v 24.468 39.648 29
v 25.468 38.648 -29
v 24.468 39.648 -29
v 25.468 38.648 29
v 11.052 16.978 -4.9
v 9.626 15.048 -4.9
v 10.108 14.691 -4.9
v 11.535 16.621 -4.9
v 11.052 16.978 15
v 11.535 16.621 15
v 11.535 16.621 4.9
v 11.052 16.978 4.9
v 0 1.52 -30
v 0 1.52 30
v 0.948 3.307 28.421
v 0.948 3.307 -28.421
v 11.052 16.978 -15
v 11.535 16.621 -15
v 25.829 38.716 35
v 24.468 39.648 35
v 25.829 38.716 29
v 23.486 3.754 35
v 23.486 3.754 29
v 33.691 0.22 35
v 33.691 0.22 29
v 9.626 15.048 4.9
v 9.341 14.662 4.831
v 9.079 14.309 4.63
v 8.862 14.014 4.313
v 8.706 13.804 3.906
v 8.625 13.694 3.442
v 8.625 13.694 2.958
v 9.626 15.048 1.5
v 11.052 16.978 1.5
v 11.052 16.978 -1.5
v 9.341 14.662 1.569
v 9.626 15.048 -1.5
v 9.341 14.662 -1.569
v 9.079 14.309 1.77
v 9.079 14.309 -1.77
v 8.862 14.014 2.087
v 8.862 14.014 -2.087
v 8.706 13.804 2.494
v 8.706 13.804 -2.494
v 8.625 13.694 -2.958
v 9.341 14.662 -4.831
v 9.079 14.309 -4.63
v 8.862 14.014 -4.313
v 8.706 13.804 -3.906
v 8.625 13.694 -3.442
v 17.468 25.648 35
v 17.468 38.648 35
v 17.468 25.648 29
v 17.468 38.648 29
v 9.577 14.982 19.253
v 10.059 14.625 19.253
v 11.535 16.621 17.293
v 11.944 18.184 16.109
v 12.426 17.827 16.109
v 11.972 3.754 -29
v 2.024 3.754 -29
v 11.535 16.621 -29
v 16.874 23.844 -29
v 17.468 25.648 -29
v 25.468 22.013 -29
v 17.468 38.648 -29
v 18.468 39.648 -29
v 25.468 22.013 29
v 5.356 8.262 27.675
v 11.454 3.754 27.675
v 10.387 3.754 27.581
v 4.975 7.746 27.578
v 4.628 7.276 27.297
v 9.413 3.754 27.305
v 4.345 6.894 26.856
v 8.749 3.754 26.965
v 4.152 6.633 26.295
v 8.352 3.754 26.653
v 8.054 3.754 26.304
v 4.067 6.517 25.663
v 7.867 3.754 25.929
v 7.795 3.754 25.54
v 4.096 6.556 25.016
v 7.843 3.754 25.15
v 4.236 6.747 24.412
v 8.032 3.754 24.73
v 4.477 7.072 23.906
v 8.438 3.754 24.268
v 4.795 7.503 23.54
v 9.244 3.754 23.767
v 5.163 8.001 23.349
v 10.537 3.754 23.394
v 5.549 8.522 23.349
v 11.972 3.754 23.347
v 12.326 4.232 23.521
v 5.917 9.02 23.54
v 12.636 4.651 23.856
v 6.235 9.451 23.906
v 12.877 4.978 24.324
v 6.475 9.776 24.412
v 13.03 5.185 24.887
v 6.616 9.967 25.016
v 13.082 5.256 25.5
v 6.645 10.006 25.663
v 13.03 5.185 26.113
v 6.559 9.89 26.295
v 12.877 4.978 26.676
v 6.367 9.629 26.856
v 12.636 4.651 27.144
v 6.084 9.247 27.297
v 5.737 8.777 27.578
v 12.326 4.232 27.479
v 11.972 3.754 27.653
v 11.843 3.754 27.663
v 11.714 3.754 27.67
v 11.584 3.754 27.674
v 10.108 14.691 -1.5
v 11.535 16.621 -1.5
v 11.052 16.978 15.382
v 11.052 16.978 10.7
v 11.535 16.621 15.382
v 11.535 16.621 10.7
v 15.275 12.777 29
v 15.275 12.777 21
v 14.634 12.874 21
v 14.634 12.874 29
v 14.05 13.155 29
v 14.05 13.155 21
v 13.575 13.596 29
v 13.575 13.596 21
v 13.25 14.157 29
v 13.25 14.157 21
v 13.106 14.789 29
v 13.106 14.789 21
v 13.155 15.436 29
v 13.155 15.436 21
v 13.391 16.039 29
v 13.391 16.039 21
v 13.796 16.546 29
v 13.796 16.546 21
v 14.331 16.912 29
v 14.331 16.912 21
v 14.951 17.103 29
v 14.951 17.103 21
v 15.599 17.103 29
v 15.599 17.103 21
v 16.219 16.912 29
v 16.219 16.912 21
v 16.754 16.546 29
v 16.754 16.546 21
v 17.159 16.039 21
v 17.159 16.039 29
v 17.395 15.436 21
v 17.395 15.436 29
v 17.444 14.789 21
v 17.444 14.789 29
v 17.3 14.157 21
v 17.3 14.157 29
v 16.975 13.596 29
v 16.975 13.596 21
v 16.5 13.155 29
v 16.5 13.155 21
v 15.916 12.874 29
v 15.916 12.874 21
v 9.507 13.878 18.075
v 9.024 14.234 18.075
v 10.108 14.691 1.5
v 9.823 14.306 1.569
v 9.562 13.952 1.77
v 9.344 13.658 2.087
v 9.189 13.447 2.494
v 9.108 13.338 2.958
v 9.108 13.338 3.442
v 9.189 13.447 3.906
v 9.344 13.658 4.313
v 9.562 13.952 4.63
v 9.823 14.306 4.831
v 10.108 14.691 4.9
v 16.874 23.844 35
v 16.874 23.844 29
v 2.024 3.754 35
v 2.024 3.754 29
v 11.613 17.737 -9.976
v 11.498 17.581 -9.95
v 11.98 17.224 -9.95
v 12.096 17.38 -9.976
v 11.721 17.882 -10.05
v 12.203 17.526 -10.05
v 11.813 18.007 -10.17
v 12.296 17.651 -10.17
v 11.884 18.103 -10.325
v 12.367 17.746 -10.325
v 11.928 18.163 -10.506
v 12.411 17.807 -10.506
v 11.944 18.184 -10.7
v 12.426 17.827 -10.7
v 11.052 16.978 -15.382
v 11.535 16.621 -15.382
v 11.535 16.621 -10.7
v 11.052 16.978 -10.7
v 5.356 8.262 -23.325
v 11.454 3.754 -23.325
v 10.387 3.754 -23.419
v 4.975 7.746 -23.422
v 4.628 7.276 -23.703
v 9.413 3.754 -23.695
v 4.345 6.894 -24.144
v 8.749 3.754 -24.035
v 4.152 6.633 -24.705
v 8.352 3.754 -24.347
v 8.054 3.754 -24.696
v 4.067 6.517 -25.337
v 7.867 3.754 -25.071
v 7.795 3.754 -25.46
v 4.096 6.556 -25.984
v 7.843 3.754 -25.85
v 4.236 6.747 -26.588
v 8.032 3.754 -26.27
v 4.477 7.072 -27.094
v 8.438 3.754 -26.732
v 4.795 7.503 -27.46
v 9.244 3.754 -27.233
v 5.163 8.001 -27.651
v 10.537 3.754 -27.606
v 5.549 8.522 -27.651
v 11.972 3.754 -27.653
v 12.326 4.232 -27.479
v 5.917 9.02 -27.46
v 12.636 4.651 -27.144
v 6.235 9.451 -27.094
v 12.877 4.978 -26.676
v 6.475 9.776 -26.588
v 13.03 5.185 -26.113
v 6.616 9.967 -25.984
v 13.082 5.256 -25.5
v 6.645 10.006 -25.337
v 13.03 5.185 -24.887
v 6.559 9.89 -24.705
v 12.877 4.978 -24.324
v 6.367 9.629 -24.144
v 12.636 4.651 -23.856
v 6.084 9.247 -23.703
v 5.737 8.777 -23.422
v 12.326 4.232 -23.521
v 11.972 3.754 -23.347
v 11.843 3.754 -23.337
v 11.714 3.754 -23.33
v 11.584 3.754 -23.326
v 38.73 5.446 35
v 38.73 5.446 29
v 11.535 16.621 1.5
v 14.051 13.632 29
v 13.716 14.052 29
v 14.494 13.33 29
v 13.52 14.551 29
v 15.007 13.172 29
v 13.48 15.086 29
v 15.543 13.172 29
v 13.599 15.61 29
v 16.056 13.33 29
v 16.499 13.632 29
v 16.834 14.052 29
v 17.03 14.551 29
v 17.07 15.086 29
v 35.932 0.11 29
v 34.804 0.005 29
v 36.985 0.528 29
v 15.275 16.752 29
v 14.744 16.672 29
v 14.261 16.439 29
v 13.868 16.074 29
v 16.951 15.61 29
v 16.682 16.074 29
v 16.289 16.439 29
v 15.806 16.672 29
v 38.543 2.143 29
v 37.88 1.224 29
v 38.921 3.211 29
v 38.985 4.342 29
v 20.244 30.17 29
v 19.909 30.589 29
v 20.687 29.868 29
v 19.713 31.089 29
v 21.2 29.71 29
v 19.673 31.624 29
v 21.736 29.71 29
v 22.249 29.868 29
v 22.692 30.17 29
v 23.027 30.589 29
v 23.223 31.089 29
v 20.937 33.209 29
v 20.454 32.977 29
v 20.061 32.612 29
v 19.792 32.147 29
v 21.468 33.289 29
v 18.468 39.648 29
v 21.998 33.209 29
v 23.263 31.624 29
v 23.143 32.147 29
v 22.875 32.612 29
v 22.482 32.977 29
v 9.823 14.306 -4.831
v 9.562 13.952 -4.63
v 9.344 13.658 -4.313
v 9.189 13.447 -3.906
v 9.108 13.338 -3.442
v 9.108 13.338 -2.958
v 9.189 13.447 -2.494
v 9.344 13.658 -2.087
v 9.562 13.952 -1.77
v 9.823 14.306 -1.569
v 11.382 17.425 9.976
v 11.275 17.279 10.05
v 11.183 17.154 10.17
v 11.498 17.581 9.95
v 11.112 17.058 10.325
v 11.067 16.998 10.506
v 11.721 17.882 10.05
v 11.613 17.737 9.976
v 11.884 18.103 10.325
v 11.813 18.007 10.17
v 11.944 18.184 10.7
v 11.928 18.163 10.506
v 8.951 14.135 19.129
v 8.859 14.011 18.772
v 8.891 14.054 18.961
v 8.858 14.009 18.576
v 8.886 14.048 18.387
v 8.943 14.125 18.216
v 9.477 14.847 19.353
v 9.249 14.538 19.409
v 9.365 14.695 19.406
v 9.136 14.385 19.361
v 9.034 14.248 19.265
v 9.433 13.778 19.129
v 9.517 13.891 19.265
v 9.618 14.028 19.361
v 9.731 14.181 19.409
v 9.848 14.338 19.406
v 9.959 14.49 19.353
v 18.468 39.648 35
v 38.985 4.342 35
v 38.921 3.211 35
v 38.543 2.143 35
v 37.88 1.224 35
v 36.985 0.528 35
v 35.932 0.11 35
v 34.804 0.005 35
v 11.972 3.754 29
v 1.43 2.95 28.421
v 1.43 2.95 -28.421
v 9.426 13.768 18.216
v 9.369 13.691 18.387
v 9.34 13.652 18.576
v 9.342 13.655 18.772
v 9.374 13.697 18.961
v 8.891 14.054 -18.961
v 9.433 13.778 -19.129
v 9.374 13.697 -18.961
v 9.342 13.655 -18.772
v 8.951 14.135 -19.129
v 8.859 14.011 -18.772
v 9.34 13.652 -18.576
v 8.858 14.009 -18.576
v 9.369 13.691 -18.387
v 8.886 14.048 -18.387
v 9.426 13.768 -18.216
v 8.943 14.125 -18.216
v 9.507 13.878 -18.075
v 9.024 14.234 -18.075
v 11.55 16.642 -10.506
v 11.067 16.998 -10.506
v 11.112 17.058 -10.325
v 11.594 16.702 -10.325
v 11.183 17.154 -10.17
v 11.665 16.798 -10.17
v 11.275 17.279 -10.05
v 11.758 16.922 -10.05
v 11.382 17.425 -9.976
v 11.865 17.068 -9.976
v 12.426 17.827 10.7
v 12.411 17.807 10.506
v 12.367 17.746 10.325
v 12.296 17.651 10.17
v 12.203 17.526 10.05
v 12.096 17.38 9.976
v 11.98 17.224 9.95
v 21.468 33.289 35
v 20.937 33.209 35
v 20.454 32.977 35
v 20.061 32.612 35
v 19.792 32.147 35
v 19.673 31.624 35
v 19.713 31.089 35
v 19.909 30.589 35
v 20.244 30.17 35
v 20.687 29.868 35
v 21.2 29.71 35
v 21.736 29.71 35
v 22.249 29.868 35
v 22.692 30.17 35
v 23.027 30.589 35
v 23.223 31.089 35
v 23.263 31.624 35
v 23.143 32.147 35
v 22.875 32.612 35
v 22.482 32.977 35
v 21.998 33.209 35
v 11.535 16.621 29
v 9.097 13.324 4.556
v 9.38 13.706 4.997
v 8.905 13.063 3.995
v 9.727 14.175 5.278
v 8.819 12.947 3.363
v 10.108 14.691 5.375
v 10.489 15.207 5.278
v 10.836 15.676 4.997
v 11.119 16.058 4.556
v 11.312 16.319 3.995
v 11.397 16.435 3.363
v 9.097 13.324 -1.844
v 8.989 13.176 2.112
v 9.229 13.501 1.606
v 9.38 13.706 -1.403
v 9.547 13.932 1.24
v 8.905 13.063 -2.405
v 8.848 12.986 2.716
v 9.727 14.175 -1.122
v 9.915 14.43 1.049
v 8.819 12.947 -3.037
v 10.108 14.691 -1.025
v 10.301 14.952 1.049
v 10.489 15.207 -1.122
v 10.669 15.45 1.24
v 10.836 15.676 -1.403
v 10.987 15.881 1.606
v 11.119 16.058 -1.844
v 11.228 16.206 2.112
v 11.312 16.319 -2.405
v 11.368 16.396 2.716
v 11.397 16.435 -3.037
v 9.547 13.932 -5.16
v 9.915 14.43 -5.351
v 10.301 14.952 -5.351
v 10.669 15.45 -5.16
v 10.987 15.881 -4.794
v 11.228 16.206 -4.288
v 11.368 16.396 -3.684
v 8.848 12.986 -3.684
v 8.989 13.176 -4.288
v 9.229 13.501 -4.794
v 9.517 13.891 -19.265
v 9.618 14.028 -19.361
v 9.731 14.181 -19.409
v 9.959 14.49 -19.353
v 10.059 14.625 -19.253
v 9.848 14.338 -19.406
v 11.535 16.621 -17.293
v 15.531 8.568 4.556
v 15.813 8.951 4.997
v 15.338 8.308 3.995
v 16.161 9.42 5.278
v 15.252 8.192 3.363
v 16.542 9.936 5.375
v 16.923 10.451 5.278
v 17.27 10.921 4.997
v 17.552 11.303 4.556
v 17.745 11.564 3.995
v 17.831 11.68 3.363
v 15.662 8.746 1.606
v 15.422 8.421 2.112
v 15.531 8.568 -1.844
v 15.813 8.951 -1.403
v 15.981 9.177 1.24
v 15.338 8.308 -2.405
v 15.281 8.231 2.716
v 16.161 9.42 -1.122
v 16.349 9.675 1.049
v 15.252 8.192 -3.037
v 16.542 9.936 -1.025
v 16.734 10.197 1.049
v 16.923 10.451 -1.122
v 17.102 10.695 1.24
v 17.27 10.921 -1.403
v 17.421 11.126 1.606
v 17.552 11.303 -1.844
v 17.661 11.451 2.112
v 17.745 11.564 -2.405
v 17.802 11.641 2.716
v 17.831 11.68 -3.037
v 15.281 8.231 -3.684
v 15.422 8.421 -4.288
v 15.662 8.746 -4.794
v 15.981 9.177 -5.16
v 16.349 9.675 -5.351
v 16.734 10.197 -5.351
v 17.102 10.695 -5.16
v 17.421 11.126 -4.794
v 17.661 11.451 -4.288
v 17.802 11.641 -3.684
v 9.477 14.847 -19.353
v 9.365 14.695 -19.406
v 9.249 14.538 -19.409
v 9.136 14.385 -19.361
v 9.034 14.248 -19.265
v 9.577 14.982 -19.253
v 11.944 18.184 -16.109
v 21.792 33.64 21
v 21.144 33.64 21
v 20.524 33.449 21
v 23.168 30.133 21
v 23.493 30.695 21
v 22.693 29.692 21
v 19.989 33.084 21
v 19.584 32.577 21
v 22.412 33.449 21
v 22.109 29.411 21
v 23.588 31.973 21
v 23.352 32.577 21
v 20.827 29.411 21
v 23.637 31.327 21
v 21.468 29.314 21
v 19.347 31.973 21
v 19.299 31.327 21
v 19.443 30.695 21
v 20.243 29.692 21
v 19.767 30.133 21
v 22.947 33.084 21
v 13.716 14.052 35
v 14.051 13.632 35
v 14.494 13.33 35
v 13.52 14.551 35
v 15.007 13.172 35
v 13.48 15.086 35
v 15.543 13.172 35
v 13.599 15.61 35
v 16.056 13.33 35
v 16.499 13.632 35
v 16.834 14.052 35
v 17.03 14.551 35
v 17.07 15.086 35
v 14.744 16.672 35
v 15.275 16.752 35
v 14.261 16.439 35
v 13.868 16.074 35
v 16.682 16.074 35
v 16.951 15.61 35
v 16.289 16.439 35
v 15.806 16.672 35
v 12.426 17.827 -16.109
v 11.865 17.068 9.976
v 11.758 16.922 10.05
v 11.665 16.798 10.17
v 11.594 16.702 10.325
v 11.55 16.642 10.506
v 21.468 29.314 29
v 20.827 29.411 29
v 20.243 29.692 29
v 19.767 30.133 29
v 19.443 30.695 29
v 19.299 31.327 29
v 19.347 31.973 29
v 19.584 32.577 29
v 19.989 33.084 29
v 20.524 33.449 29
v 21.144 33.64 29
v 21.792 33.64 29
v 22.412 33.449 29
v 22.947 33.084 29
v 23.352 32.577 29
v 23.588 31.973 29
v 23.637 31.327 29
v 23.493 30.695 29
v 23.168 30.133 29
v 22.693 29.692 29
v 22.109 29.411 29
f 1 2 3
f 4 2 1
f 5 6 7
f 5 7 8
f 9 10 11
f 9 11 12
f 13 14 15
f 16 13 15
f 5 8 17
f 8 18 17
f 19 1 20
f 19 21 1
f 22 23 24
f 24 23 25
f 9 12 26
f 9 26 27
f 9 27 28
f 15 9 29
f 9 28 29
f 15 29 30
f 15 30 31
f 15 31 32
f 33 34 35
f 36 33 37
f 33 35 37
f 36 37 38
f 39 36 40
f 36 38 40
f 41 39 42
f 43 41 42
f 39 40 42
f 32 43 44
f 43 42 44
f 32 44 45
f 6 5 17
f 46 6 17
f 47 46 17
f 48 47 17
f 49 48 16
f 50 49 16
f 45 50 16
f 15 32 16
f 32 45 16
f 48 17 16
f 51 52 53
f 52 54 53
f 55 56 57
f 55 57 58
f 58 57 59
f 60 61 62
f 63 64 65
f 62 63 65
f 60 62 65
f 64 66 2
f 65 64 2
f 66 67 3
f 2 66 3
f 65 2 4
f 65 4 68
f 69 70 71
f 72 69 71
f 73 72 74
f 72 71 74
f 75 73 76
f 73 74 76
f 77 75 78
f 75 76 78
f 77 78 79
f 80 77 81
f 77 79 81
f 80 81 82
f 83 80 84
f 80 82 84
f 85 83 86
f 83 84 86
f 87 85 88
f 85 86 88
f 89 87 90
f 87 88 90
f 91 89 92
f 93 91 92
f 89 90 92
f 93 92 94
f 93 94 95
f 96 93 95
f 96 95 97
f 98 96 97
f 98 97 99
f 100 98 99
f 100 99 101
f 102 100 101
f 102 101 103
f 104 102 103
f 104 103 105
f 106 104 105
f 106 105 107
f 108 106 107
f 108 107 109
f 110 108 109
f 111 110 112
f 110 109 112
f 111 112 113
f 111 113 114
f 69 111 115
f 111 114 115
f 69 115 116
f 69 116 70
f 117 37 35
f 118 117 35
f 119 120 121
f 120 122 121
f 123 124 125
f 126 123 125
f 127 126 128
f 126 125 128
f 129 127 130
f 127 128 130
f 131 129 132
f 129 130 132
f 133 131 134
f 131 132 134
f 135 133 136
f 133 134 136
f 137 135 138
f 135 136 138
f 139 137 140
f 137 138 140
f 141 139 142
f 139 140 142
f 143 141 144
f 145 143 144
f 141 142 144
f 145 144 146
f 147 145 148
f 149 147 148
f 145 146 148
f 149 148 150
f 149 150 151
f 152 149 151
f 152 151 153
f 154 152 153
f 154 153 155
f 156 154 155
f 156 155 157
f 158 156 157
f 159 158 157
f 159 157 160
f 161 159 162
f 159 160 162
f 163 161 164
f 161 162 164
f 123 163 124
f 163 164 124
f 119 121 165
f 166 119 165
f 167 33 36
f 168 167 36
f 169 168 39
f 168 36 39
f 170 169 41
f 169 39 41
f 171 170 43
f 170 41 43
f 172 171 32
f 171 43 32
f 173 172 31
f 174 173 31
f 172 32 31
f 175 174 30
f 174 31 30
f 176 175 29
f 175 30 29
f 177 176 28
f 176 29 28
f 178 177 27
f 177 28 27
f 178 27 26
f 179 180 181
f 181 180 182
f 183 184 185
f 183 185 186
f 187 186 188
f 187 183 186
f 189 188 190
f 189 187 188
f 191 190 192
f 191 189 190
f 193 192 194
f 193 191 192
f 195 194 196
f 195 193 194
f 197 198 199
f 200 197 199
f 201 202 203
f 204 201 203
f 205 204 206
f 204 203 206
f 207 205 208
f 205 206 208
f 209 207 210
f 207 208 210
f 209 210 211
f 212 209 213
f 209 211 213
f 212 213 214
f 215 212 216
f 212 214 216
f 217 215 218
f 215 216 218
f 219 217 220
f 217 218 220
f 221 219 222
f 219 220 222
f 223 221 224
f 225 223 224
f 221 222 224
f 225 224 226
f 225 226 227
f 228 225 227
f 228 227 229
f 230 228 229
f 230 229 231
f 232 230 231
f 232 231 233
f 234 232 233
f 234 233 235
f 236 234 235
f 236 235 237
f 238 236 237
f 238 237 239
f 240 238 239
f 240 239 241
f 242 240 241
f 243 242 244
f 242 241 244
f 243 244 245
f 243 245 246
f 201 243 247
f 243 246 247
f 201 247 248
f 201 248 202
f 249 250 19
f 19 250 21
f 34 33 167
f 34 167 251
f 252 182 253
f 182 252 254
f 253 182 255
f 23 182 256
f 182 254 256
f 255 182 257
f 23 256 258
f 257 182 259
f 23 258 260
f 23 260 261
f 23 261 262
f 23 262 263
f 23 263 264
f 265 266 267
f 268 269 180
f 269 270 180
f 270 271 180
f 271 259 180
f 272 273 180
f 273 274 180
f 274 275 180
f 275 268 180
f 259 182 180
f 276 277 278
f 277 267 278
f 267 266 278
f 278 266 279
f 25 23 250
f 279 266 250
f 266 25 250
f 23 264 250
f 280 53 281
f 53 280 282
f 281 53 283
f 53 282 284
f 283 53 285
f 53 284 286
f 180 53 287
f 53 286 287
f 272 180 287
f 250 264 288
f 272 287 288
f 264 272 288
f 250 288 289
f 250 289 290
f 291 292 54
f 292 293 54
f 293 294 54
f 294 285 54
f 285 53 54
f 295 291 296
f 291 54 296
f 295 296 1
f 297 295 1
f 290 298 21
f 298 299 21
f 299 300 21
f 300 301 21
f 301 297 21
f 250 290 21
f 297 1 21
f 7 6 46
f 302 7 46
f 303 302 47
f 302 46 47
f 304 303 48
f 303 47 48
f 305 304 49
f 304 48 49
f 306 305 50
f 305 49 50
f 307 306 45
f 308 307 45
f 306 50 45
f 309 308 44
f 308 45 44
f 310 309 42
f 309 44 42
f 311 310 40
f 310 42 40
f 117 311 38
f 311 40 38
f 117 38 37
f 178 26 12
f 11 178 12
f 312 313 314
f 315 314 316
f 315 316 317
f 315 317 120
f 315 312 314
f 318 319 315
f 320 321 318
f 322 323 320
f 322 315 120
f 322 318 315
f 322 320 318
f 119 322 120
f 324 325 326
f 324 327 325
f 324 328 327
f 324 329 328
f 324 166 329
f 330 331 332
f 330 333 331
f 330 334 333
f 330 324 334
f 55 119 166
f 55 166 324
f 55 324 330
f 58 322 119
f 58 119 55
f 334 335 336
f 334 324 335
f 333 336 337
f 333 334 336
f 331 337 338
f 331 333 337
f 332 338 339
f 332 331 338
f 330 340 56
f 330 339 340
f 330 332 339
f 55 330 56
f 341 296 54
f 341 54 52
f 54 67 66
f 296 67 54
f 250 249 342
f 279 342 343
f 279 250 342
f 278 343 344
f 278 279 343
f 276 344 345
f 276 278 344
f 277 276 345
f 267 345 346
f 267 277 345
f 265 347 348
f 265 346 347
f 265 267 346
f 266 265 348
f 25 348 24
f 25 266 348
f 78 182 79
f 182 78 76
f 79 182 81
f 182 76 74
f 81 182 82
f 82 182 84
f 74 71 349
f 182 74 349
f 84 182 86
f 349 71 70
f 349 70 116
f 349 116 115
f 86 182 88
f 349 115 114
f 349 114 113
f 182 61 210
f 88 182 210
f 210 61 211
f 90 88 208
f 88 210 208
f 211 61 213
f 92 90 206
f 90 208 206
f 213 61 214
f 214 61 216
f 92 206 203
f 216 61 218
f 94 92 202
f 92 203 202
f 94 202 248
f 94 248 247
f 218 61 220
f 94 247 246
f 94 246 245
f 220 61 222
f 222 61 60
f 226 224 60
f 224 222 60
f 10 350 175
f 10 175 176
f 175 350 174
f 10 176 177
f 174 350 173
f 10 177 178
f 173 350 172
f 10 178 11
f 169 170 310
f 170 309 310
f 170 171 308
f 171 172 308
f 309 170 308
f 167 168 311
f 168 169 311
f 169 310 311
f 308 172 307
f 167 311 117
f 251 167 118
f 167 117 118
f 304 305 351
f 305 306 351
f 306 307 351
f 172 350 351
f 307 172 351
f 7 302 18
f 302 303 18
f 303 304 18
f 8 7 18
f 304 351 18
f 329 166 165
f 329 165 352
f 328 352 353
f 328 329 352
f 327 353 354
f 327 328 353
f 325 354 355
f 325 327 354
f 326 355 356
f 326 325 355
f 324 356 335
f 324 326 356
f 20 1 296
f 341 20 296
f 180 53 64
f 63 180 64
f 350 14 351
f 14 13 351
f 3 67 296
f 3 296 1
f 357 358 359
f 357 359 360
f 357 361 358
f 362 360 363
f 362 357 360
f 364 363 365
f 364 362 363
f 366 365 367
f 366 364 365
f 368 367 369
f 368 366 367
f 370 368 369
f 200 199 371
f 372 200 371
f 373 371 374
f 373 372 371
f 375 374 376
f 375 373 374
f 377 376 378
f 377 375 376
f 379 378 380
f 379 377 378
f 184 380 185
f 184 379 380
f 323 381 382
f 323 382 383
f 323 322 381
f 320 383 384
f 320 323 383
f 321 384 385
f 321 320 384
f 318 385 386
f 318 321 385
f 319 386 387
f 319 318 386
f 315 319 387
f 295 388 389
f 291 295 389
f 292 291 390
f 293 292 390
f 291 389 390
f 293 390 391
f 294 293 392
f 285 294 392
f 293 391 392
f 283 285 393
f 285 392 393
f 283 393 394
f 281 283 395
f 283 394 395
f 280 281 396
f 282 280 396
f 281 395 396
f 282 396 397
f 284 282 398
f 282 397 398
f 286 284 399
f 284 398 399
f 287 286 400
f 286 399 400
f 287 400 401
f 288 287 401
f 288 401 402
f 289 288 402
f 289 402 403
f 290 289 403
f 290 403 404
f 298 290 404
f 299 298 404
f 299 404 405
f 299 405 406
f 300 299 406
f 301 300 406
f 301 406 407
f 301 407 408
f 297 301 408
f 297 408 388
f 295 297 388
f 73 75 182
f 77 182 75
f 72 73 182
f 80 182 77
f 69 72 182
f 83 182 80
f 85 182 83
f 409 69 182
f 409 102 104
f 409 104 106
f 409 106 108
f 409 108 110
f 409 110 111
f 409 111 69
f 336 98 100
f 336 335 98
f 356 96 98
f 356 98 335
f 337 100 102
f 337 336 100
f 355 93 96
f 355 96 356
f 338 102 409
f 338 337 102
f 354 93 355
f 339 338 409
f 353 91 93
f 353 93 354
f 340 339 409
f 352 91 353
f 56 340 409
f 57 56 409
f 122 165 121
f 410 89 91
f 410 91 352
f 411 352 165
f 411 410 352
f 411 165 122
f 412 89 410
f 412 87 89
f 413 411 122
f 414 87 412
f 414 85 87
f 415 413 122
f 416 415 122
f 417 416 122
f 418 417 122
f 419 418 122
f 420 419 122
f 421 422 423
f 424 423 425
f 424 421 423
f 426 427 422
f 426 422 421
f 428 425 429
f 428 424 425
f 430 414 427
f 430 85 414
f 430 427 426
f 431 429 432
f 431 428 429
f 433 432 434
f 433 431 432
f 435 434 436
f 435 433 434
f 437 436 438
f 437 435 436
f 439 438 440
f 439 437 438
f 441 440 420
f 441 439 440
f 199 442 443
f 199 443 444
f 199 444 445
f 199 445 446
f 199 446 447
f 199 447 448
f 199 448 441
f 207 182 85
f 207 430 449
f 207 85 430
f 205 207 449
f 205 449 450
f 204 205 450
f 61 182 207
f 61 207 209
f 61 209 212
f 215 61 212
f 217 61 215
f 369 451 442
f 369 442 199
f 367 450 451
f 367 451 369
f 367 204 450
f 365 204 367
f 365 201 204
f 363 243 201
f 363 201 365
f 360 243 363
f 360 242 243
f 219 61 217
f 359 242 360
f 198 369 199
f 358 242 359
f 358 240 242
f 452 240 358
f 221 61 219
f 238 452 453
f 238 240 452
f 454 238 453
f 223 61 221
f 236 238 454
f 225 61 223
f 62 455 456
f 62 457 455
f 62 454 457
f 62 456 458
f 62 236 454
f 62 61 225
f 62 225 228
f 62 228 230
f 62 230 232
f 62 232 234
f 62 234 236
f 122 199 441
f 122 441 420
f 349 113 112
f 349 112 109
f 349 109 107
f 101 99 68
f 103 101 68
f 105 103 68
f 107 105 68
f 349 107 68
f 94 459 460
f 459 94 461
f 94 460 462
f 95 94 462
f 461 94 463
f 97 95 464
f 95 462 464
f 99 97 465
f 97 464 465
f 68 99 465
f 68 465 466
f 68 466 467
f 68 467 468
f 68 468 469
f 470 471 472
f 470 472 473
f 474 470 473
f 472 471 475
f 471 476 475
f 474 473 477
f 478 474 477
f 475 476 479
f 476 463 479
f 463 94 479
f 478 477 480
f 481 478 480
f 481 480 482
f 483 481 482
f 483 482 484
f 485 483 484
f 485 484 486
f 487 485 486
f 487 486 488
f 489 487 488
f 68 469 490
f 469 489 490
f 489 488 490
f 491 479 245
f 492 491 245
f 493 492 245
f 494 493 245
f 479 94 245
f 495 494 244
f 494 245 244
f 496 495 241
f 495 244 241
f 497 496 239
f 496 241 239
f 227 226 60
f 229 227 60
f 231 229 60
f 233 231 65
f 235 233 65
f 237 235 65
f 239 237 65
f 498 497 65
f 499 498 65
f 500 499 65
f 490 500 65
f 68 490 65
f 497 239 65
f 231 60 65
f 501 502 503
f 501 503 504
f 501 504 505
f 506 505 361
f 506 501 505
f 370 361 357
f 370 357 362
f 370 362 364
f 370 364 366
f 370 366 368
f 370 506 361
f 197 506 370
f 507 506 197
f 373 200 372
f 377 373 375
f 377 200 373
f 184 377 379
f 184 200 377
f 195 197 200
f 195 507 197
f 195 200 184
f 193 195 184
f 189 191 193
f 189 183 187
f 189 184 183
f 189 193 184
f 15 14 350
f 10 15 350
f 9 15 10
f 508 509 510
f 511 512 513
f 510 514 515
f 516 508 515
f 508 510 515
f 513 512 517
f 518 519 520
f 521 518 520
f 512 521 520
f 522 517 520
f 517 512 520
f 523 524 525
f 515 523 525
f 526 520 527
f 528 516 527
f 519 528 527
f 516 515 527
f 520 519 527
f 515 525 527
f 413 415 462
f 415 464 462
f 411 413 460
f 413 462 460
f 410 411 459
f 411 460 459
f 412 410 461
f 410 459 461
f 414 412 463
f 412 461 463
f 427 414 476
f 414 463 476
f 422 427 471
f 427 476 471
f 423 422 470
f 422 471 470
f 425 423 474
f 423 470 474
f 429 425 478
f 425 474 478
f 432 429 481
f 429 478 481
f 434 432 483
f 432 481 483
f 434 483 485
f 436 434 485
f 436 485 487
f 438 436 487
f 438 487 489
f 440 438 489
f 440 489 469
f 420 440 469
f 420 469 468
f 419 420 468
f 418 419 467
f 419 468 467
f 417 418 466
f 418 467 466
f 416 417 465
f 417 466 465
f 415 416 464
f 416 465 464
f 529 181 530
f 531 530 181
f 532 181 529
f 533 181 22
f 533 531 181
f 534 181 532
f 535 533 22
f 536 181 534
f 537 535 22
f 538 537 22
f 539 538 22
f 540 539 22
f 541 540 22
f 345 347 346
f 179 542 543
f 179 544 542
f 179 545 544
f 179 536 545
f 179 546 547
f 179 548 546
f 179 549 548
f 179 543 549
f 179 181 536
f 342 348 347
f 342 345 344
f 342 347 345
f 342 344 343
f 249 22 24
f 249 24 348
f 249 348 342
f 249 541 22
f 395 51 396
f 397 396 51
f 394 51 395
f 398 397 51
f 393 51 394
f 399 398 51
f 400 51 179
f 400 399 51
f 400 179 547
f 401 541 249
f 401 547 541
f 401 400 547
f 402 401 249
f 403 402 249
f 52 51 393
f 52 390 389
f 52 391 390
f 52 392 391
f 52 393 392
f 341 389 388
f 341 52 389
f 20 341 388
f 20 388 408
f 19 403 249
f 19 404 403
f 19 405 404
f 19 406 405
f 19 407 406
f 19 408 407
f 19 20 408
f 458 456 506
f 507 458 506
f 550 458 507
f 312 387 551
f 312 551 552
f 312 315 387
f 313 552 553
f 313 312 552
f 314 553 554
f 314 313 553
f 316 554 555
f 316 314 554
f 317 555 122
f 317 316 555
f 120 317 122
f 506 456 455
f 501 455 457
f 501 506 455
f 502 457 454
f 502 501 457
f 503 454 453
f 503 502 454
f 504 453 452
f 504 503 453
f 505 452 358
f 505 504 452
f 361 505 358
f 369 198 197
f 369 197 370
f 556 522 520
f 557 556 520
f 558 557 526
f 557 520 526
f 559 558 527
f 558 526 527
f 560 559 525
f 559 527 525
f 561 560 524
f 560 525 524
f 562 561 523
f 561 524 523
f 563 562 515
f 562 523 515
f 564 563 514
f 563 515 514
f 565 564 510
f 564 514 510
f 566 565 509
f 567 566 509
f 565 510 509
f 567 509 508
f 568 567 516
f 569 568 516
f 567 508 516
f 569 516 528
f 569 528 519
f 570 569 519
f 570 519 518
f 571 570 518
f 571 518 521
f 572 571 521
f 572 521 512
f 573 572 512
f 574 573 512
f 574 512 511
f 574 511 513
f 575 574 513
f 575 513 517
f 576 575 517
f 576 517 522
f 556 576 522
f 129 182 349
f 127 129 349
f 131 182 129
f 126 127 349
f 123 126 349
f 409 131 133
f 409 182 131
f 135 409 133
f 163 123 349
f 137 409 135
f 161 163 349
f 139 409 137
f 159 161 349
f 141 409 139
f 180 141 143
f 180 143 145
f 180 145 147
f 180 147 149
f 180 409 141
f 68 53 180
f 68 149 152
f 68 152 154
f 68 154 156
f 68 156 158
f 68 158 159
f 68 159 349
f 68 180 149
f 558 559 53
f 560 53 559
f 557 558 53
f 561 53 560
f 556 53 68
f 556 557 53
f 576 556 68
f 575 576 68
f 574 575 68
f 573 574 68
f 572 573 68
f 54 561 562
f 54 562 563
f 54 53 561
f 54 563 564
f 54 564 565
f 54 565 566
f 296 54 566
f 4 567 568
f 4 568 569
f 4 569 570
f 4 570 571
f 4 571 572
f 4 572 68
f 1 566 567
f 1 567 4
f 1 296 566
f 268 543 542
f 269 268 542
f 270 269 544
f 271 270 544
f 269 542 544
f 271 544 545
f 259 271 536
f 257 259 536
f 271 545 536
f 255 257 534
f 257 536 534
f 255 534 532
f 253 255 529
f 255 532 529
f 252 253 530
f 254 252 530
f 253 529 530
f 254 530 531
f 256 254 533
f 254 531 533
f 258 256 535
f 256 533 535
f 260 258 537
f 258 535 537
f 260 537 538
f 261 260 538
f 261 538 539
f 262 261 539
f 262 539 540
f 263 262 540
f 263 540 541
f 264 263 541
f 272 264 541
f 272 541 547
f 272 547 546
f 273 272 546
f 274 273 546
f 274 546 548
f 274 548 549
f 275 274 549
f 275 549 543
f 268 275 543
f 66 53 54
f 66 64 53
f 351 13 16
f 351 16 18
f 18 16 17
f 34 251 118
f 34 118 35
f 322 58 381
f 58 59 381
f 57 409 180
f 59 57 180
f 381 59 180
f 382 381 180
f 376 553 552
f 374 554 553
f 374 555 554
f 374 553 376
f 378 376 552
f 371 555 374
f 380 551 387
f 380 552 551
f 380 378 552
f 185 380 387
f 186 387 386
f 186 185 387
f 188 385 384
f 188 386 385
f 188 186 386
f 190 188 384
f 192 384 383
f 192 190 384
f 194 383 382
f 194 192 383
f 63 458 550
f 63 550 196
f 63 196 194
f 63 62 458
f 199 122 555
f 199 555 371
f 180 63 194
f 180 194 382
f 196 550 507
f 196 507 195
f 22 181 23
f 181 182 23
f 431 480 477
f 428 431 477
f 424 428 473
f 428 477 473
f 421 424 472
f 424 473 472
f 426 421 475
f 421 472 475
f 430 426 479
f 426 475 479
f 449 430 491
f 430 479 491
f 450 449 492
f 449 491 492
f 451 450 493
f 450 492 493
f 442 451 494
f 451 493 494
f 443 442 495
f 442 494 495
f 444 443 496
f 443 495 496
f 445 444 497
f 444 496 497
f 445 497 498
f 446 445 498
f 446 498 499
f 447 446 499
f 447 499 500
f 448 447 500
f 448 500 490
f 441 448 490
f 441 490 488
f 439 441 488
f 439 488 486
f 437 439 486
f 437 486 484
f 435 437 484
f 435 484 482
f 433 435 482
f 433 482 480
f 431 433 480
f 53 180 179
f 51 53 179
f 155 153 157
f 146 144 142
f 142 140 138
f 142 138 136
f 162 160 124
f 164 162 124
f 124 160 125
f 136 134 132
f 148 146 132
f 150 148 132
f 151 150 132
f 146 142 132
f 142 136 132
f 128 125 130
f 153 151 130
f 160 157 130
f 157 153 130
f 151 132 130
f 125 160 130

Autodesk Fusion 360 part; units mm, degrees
sketch "Blade Stock Layout and Angle setting" plane through (0, 0, 0) normal (0, 0, 1) x (1, 0, 0) in component "Blade"
  line L0 (0, 1.52) -> (0.9475, 3.3067)
  line L1 (0, 1.52) -> (1.43, 2.95)
  line L2 (0.9475, 3.3067) -> (1.43, 2.95) construction
  line L3 (1.43, 2.95) -> (11.5347, 16.621)
  line L4 (11.5347, 16.621) -> (11.0522, 16.9777)
  line L5 (11.0522, 16.9777) -> (0.9475, 3.3067)
  line L6 (0, 1.52) -> (0, 0) construction
  line L7 (0, 0) -> (17.3611, 0) construction
  dimension "d6" = 1.52
  dimension "d8" = 0.6
  dimension "d9" = 2
  dimension "d10" = 19
  dimension "d11" = 45
extrude "Blade Stock" add sketch "Blade Stock Layout and Angle setting" along normal mid plane 60 makes body 1 in component "Blade"
sketch "Blade profile" plane through (-0.9678, 0.7153, 0) normal (-0.8042, 0.5944, 0) x (0, 0, 1) in component "Blade"
  line L0 (-30, 20.2223) -> (-30, 3.2223)
  line L1 (-30, 3.2223) -> (30, 3.2223) construction
  line L2 (30, 3.2223) -> (30, 20.2223)
  line L3 (30, 20.2223) -> (-30, 20.2223)
  line L4 (0, 20.2223) -> (0, 3.2223) construction
  line L5 (30, 1.2223) -> (15, 20.2223)
  circle A0 centre (3.2, 17.8223) radius 1.7
  line L6 (1.5, 17.8223) -> (1.5, 20.2223)
  line L7 (4.9, 17.8223) -> (4.9, 20.2223)
  line L8 (3.2, 20.2223) -> (3.2, 16.1223) construction
  circle A1 centre (-3.2, 17.8223) radius 1.7
  line L9 (-1.5, 17.8223) -> (-1.5, 20.2223)
  line L10 (-4.9, 17.8223) -> (-4.9, 20.2223)
  line L11 (-30, 1.2223) -> (-15, 20.2223)
  line L12 (30, 1.2223) -> (30, 3.2223)
  line L13 (-30, 1.2223) -> (-30, 3.2223)
  point P0 (30, 1.2223)
  dimension "d20" = 15
  dimension "d21" = 3.4
  dimension "d22" = 1.5
  dimension "d23" = 4.1
extrude "Blaade profile" cut sketch "Blade profile" against normal through all bodies 1 in component "Blade"
sketch "Blade Holder Stock Layout" plane through (0, 0, 0) normal (0, 0, 1) x (1, 0, 0) in component "Blade Holder"
  line L0 (0.9475, 3.3067) -> (0, 1.52)
  line L1 (0, 1.52) -> (1.43, 2.95)
  line L2 (1.43, 2.95) -> (11.5347, 16.621)
  line L3 (11.5347, 16.621) -> (11.0522, 16.9777)
  line L4 (11.0522, 16.9777) -> (0.9475, 3.3067)
  line L5 (1.2783, 3.7542) -> (11.9725, 3.7542)
  line L6 (11.9725, 3.7542) -> (25.4679, 22.0127)
  line L7 (11.5347, 16.621) -> (17.4679, 24.6483)
  line L8 (17.4679, 24.6483) -> (17.4679, 39.6483)
  line L9 (17.4679, 39.6483) -> (25.4679, 39.6483)
  line L10 (25.4679, 39.6483) -> (25.4679, 22.0127)
  line L11 (17.4679, 24.6483) -> (25.4679, 24.6483) construction
  line L12 (17.4679, 24.6483) -> (23.9013, 19.8932) construction
  line L13 (11.5347, 16.621) -> (1.43, 2.95)
  point P0 (2.0244, 3.7542)
  dimension "d30" = 8
  dimension "d31" = 15
  dimension "d32" = 10
  dimension "d40" = 1
extrude "Blade Holder Stock" add sketch "Blade Holder Stock Layout" along normal mid plane 58 separate body contours L2 L5 L6 L7 L8 L9 L10 L13 makes body 2 in component "Blade Holder"
sketch "Blade holder lateral stops layout" plane through (-0.4853, 0.3587, 0) normal (-0.8042, 0.5944, 0) x (0, 0, 1) in component "Blade Holder"
  line L0 (-29, 4.2223) -> (29, 4.2223)
  line L1 (29, 4.2223) -> (29, 30.2043)
  line L2 (-29, 30.2043) -> (-29, 4.2223)
  line L3 (28.4211, 3.2223) -> (15, 20.2223)
  line L4 (14.9301, 20.795) -> (28.0138, 4.2223)
  line L5 (0, 1.4073) -> (0, 18.094)
  line L6 (-14.9301, 20.795) -> (-28.0138, 4.2223)
  circle A0 centre (25.5, 9.8272) radius 1.5 construction
  line L7 (25.5, 9.8272) -> (27, 9.8272) construction
  line L8 (27, 9.8272) -> (29, 9.8272) construction
  line L9 (29, 30.2043) -> (-29, 30.2043)
  line L10 (4.9, 20.2223) -> (15, 20.2223)
  line L11 (-1.5, 20.2223) -> (1.5, 20.2223) construction
  line L12 (-15, 20.2223) -> (-4.9, 20.2223)
  line L13 (4.9, 20.2223) -> (1.5, 20.2223) construction
  line L14 (-1.5, 20.2223) -> (-4.9, 20.2223) construction
  line L15 (15, 20.2223) -> (15.3822, 20.2223)
  line L16 (-15, 20.2223) -> (-15.3822, 20.2223)
  line L17 (18.5401, 16.2223) -> (19.7174, 17.1518)
  line L18 (19.7174, 17.1518) -> (16.1091, 21.7223)
  line L19 (16.1091, 21.7223) -> (0, 21.7223)
  line L20 (0, 21.7223) -> (0, 20.2223) construction
  line L21 (-16.1091, 21.7223) -> (0, 21.7223)
  line L22 (-19.7174, 17.1518) -> (-16.1091, 21.7223)
  line L23 (-18.5401, 16.2223) -> (-19.7174, 17.1518)
  line L24 (9.95, 20.2223) -> (9.95, 21.7223)
  line L25 (-9.95, 20.2223) -> (-9.95, 21.7223)
  dimension "d42" = 0.3
  dimension "d93" = 3
  dimension "d94" = 2
  dimension "d95" = 1.5
  dimension "d97" = 4
extrude "Extrude3" add sketch "Blade holder lateral stops layout" along normal up to surface (0.6 mm away) contours L6 L12 L16 L21 L22 L23 L25 | L4 L10 L15 L17 L18 L19 L24 bodies 2 in component "Blade Holder"
sketch "Blade hole layout in holder" plane through (-0.4853, 0.3587, 0) normal (-0.8042, 0.5944, 0) x (0, 0, 1) in component "Blade Holder"
  line L0 (-29, 4.2223) -> (29, 4.2223)
  arc A0 (-4.9, 17.8223) -> (-1.5, 17.8223) centre (-3.2, 17.8223) ccw
  arc A1 (1.5, 17.8223) -> (4.9, 17.8223) centre (3.2, 17.8223) ccw
  line L1 (-29, 30.2043) -> (-29, 4.2223)
  circle A2 centre (25.5, 9.8272) radius 1.5 construction
  line L2 (0, 1.4073) -> (0, 18.094)
  circle A3 centre (-25.5, 9.8272) radius 1.5 construction
  line L3 (29, 4.2223) -> (29, 30.2043)
  line L4 (29, 30.2043) -> (-29, 30.2043)
  line L5 (15.3822, 20.2223) -> (9.95, 20.2223)
  line L6 (9.95, 20.2223) -> (9.95, 21.7223)
  line L7 (9.95, 21.7223) -> (16.1091, 21.7223)
  line L8 (16.1091, 21.7223) -> (19.7174, 17.1518)
  line L9 (-19.7174, 17.1518) -> (-16.1091, 21.7223)
  line L10 (-16.1091, 21.7223) -> (-9.95, 21.7223)
  line L11 (-9.95, 21.7223) -> (-9.95, 20.2223)
  line L12 (-9.95, 20.2223) -> (-15.3822, 20.2223)
  line L13 (-15.3822, 20.2223) -> (-18.5401, 16.2223)
  line L14 (-18.5401, 16.2223) -> (-19.7174, 17.1518)
  line L15 (19.7174, 17.1518) -> (18.5401, 16.2223)
  line L16 (18.5401, 16.2223) -> (15.3822, 20.2223)
hole "Hole1" at (10.1081, 14.691, -3.2) at (10.1081, 14.691, 3.2) at (5.3559, 8.2615, 25.5) at (5.3559, 8.2615, -25.5) direction (0.8042, -0.5944, 0) diameter 4.35 end through all bodies 2 2 in component "Blade Holder"
sketch "Support Arm Stock Layout" plane through (0, 0, 29) normal (0, 0, 1) x (1, 0, 0) in component "Support Arm"
  line L0 (17.4679, 24.6483) -> (2.0244, 3.7542)
  line L1 (2.0244, 3.7542) -> (11.9725, 3.7542)
  line L2 (11.9725, 3.7542) -> (25.4679, 22.0127)
  line L3 (25.4679, 22.0127) -> (25.4679, 39.6483)
  line L4 (25.4679, 39.6483) -> (17.4679, 39.6483)
  line L5 (17.4679, 39.6483) -> (17.4679, 24.6483)
  line L6 (0, 0) -> (35, 0) construction
  line L7 (38.7295, 5.4461) -> (25.4679, 39.6483)
  circle A0 centre (35, 4) radius 4
  line L8 (23.4862, 3.7542) -> (33.691, 0.2202)
  line L9 (11.9725, 3.7542) -> (35, 3.7542) construction
  line L10 (35, 3.7542) -> (35, 4) construction
  line L11 (23.4862, 3.7542) -> (11.9725, 3.7542)
  line L12 (17.4679, 32.1483) -> (25.4679, 30.8305) construction
  line L13 (12.0583, 17.3295) -> (18.4917, 12.5743) construction
  line L14 (4.0631, 6.5124) -> (6.6487, 10.0106)
  line L15 (6.6487, 10.0106) -> (17.4679, 24.6483)
  point P0 (21.4679, 31.4894)
  point P1 (15.275, 14.9519)
  dimension "d58" = 8
  dimension "d61" = 35
extrude "Support Arm Stock" add sketch "Support Arm Stock Layout" along normal blind 6 separate body makes body 3 in component "Support Arm"
hole "Hole1'" at (15.275, 14.9519, 29) at (21.4679, 31.4894, 29) direction (0, 0, 1) diameter 3.6 end through all bodies 3 3 in component "Support Arm"
sketch "Support arm hole layout in holder" plane through (0, 0, 29) normal (0, 0, 1) x (1, 0, 0) in component "Blade Holder"
  line L0 (17.4679, 24.6483) -> (2.0244, 3.7542)
  line L1 (2.0244, 3.7542) -> (11.9725, 3.7542)
  line L2 (11.9725, 3.7542) -> (25.4679, 22.0127)
  line L3 (25.4679, 22.0127) -> (25.4679, 39.6483)
  line L4 (25.4679, 39.6483) -> (17.4679, 39.6483)
  line L5 (17.4679, 39.6483) -> (17.4679, 24.6483)
  circle A0 centre (21.4679, 31.4894) radius 1.8
  circle A1 centre (15.275, 14.9519) radius 1.8
hole "support arm holes in holder" at (21.4679, 31.4894, 29) at (15.275, 14.9519, 29) direction (0, 0, -1) diameter 4.35 depth 8 tip angle 180 bodies 2 in component "Blade Holder"
chamfer "Support Arm chamfers" distance 1 angle 45 3 edges at (17.4679, 39.6483, 32) (25.4679, 39.6483, 32) (17.4679, 24.6483, 32) on bodies 3 in component "Support Arm"
chamfer "Blade Holder Chamfers" distance 1 angle 45 3 edges at (17.4679, 39.6483, 0) (17.4679, 24.6483, 0) (25.4679, 39.6483, 0) on bodies 2 in component "Blade Holder"
fillet "lateral Stops Fillets" radius 0.75 4 edges at (9.4683, 14.3301, 19.7174) (8.9159, 13.5826, 18.5401) (11.2934, 16.7993, 9.95) (12.185, 18.0056, 9.95) on bodies 2 in component "Blade Holder"
fillet "lateral Stops Fillets" radius 0.75 4 edges at (8.9159, 13.5826, -18.5401) (11.2934, 16.7993, -9.95) (12.185, 18.0056, -9.95) (9.4683, 14.3301, -19.7174) on bodies 2 in component "Blade Holder"
component "Blade" placed x (1, 0, 0) y (0, 1, 0) z (0, 0, 1) at (0, 0, 0)
component "Blade Holder" placed x (1, 0, 0) y (0, 1, 0) z (0, 0, 1) at (0, 0, 0)
component "Support Arm" placed x (1, 0, 0) y (0, 1, 0) z (0, 0, 1) at (0, 0, 0)
equation "blade_thickness = 0.6 mm"
equation "blade_width = 19 mm"
equation "edge_width = 2 mm"
equation "blade_height = 1.52 mm"
equation "d6 = blade_height"
equation "d8 = blade_thickness"
equation "d9 = edge_width"
equation "d10 = blade_width"
equation "d11 = blade_angle"
equation "blade_angle = 45 deg"
equation "edge_length = 60 mm"
equation "d14 = edge_length"
equation "blade_body_length = 30 mm"
equation "blade_cutout_depth = 4.1 mm"
equation "blade_cutout_width = 3.4 mm"
equation "blade_tab_width = 3 mm"
equation "d20 = blade_body_length / 2"
equation "d21 = blade_cutout_width"
equation "d22 = blade_tab_width / 2"
equation "d23 = blade_cutout_depth"
equation "handle_thickness = 8 mm"
equation "edge_holder_offset = 1 mm"
equation "handle_height = 15 mm"
equation "edge_handle_offset = 10 mm"
equation "d30 = handle_thickness"
equation "d31 = handle_height"
equation "d32 = edge_handle_offset"
equation "blade_holder_length = 58 mm"
equation "d34 = blade_holder_length"
equation "blade_width_offset = 0.3 mm"
equation "d40 = edge_holder_offset"
equation "d42 = blade_width_offset"
equation "M3_threaded_insert_diameter = 4.35 mm"
equation "M3_threaded_insert_depth = 8 mm"
equation "d48 = M3_threaded_insert_diameter"
equation "support_arm_thickness = 6 mm"
equation "support_arm_edge_separation = 35 mm"
equation "support_arm_radius = 4 mm"
equation "d58 = support_arm_radius * 2"
equation "d61 = support_arm_edge_separation"
equation "d62 = support_arm_thickness"
equation "M3_clearance_diameter = 3.6 mm"
equation "d66 = M3_clearance_diameter"
equation "d68 = M3_threaded_insert_depth"
equation "d69 = M3_threaded_insert_diameter"
equation "bladeClampWidthOffsets = 1 mm"
equation "blade_clamp_height_offset = 1 mm"
equation "blade_clamp_height_extent = 2 mm"
equation "clamp_thickness = 8 mm"
equation "clamp_chamfer = 5 mm"
equation "d94 = side_bolt_offset"
equation "d95 = lateral_stop_width"
equation "d97 = lateral_stop_vertical_extent"
equation "lateral_stop_width = 1.5 mm"
equation "lateral_stop_vertical_extent = 4 mm"
equation "side_bolt_offset = 2 mm"
